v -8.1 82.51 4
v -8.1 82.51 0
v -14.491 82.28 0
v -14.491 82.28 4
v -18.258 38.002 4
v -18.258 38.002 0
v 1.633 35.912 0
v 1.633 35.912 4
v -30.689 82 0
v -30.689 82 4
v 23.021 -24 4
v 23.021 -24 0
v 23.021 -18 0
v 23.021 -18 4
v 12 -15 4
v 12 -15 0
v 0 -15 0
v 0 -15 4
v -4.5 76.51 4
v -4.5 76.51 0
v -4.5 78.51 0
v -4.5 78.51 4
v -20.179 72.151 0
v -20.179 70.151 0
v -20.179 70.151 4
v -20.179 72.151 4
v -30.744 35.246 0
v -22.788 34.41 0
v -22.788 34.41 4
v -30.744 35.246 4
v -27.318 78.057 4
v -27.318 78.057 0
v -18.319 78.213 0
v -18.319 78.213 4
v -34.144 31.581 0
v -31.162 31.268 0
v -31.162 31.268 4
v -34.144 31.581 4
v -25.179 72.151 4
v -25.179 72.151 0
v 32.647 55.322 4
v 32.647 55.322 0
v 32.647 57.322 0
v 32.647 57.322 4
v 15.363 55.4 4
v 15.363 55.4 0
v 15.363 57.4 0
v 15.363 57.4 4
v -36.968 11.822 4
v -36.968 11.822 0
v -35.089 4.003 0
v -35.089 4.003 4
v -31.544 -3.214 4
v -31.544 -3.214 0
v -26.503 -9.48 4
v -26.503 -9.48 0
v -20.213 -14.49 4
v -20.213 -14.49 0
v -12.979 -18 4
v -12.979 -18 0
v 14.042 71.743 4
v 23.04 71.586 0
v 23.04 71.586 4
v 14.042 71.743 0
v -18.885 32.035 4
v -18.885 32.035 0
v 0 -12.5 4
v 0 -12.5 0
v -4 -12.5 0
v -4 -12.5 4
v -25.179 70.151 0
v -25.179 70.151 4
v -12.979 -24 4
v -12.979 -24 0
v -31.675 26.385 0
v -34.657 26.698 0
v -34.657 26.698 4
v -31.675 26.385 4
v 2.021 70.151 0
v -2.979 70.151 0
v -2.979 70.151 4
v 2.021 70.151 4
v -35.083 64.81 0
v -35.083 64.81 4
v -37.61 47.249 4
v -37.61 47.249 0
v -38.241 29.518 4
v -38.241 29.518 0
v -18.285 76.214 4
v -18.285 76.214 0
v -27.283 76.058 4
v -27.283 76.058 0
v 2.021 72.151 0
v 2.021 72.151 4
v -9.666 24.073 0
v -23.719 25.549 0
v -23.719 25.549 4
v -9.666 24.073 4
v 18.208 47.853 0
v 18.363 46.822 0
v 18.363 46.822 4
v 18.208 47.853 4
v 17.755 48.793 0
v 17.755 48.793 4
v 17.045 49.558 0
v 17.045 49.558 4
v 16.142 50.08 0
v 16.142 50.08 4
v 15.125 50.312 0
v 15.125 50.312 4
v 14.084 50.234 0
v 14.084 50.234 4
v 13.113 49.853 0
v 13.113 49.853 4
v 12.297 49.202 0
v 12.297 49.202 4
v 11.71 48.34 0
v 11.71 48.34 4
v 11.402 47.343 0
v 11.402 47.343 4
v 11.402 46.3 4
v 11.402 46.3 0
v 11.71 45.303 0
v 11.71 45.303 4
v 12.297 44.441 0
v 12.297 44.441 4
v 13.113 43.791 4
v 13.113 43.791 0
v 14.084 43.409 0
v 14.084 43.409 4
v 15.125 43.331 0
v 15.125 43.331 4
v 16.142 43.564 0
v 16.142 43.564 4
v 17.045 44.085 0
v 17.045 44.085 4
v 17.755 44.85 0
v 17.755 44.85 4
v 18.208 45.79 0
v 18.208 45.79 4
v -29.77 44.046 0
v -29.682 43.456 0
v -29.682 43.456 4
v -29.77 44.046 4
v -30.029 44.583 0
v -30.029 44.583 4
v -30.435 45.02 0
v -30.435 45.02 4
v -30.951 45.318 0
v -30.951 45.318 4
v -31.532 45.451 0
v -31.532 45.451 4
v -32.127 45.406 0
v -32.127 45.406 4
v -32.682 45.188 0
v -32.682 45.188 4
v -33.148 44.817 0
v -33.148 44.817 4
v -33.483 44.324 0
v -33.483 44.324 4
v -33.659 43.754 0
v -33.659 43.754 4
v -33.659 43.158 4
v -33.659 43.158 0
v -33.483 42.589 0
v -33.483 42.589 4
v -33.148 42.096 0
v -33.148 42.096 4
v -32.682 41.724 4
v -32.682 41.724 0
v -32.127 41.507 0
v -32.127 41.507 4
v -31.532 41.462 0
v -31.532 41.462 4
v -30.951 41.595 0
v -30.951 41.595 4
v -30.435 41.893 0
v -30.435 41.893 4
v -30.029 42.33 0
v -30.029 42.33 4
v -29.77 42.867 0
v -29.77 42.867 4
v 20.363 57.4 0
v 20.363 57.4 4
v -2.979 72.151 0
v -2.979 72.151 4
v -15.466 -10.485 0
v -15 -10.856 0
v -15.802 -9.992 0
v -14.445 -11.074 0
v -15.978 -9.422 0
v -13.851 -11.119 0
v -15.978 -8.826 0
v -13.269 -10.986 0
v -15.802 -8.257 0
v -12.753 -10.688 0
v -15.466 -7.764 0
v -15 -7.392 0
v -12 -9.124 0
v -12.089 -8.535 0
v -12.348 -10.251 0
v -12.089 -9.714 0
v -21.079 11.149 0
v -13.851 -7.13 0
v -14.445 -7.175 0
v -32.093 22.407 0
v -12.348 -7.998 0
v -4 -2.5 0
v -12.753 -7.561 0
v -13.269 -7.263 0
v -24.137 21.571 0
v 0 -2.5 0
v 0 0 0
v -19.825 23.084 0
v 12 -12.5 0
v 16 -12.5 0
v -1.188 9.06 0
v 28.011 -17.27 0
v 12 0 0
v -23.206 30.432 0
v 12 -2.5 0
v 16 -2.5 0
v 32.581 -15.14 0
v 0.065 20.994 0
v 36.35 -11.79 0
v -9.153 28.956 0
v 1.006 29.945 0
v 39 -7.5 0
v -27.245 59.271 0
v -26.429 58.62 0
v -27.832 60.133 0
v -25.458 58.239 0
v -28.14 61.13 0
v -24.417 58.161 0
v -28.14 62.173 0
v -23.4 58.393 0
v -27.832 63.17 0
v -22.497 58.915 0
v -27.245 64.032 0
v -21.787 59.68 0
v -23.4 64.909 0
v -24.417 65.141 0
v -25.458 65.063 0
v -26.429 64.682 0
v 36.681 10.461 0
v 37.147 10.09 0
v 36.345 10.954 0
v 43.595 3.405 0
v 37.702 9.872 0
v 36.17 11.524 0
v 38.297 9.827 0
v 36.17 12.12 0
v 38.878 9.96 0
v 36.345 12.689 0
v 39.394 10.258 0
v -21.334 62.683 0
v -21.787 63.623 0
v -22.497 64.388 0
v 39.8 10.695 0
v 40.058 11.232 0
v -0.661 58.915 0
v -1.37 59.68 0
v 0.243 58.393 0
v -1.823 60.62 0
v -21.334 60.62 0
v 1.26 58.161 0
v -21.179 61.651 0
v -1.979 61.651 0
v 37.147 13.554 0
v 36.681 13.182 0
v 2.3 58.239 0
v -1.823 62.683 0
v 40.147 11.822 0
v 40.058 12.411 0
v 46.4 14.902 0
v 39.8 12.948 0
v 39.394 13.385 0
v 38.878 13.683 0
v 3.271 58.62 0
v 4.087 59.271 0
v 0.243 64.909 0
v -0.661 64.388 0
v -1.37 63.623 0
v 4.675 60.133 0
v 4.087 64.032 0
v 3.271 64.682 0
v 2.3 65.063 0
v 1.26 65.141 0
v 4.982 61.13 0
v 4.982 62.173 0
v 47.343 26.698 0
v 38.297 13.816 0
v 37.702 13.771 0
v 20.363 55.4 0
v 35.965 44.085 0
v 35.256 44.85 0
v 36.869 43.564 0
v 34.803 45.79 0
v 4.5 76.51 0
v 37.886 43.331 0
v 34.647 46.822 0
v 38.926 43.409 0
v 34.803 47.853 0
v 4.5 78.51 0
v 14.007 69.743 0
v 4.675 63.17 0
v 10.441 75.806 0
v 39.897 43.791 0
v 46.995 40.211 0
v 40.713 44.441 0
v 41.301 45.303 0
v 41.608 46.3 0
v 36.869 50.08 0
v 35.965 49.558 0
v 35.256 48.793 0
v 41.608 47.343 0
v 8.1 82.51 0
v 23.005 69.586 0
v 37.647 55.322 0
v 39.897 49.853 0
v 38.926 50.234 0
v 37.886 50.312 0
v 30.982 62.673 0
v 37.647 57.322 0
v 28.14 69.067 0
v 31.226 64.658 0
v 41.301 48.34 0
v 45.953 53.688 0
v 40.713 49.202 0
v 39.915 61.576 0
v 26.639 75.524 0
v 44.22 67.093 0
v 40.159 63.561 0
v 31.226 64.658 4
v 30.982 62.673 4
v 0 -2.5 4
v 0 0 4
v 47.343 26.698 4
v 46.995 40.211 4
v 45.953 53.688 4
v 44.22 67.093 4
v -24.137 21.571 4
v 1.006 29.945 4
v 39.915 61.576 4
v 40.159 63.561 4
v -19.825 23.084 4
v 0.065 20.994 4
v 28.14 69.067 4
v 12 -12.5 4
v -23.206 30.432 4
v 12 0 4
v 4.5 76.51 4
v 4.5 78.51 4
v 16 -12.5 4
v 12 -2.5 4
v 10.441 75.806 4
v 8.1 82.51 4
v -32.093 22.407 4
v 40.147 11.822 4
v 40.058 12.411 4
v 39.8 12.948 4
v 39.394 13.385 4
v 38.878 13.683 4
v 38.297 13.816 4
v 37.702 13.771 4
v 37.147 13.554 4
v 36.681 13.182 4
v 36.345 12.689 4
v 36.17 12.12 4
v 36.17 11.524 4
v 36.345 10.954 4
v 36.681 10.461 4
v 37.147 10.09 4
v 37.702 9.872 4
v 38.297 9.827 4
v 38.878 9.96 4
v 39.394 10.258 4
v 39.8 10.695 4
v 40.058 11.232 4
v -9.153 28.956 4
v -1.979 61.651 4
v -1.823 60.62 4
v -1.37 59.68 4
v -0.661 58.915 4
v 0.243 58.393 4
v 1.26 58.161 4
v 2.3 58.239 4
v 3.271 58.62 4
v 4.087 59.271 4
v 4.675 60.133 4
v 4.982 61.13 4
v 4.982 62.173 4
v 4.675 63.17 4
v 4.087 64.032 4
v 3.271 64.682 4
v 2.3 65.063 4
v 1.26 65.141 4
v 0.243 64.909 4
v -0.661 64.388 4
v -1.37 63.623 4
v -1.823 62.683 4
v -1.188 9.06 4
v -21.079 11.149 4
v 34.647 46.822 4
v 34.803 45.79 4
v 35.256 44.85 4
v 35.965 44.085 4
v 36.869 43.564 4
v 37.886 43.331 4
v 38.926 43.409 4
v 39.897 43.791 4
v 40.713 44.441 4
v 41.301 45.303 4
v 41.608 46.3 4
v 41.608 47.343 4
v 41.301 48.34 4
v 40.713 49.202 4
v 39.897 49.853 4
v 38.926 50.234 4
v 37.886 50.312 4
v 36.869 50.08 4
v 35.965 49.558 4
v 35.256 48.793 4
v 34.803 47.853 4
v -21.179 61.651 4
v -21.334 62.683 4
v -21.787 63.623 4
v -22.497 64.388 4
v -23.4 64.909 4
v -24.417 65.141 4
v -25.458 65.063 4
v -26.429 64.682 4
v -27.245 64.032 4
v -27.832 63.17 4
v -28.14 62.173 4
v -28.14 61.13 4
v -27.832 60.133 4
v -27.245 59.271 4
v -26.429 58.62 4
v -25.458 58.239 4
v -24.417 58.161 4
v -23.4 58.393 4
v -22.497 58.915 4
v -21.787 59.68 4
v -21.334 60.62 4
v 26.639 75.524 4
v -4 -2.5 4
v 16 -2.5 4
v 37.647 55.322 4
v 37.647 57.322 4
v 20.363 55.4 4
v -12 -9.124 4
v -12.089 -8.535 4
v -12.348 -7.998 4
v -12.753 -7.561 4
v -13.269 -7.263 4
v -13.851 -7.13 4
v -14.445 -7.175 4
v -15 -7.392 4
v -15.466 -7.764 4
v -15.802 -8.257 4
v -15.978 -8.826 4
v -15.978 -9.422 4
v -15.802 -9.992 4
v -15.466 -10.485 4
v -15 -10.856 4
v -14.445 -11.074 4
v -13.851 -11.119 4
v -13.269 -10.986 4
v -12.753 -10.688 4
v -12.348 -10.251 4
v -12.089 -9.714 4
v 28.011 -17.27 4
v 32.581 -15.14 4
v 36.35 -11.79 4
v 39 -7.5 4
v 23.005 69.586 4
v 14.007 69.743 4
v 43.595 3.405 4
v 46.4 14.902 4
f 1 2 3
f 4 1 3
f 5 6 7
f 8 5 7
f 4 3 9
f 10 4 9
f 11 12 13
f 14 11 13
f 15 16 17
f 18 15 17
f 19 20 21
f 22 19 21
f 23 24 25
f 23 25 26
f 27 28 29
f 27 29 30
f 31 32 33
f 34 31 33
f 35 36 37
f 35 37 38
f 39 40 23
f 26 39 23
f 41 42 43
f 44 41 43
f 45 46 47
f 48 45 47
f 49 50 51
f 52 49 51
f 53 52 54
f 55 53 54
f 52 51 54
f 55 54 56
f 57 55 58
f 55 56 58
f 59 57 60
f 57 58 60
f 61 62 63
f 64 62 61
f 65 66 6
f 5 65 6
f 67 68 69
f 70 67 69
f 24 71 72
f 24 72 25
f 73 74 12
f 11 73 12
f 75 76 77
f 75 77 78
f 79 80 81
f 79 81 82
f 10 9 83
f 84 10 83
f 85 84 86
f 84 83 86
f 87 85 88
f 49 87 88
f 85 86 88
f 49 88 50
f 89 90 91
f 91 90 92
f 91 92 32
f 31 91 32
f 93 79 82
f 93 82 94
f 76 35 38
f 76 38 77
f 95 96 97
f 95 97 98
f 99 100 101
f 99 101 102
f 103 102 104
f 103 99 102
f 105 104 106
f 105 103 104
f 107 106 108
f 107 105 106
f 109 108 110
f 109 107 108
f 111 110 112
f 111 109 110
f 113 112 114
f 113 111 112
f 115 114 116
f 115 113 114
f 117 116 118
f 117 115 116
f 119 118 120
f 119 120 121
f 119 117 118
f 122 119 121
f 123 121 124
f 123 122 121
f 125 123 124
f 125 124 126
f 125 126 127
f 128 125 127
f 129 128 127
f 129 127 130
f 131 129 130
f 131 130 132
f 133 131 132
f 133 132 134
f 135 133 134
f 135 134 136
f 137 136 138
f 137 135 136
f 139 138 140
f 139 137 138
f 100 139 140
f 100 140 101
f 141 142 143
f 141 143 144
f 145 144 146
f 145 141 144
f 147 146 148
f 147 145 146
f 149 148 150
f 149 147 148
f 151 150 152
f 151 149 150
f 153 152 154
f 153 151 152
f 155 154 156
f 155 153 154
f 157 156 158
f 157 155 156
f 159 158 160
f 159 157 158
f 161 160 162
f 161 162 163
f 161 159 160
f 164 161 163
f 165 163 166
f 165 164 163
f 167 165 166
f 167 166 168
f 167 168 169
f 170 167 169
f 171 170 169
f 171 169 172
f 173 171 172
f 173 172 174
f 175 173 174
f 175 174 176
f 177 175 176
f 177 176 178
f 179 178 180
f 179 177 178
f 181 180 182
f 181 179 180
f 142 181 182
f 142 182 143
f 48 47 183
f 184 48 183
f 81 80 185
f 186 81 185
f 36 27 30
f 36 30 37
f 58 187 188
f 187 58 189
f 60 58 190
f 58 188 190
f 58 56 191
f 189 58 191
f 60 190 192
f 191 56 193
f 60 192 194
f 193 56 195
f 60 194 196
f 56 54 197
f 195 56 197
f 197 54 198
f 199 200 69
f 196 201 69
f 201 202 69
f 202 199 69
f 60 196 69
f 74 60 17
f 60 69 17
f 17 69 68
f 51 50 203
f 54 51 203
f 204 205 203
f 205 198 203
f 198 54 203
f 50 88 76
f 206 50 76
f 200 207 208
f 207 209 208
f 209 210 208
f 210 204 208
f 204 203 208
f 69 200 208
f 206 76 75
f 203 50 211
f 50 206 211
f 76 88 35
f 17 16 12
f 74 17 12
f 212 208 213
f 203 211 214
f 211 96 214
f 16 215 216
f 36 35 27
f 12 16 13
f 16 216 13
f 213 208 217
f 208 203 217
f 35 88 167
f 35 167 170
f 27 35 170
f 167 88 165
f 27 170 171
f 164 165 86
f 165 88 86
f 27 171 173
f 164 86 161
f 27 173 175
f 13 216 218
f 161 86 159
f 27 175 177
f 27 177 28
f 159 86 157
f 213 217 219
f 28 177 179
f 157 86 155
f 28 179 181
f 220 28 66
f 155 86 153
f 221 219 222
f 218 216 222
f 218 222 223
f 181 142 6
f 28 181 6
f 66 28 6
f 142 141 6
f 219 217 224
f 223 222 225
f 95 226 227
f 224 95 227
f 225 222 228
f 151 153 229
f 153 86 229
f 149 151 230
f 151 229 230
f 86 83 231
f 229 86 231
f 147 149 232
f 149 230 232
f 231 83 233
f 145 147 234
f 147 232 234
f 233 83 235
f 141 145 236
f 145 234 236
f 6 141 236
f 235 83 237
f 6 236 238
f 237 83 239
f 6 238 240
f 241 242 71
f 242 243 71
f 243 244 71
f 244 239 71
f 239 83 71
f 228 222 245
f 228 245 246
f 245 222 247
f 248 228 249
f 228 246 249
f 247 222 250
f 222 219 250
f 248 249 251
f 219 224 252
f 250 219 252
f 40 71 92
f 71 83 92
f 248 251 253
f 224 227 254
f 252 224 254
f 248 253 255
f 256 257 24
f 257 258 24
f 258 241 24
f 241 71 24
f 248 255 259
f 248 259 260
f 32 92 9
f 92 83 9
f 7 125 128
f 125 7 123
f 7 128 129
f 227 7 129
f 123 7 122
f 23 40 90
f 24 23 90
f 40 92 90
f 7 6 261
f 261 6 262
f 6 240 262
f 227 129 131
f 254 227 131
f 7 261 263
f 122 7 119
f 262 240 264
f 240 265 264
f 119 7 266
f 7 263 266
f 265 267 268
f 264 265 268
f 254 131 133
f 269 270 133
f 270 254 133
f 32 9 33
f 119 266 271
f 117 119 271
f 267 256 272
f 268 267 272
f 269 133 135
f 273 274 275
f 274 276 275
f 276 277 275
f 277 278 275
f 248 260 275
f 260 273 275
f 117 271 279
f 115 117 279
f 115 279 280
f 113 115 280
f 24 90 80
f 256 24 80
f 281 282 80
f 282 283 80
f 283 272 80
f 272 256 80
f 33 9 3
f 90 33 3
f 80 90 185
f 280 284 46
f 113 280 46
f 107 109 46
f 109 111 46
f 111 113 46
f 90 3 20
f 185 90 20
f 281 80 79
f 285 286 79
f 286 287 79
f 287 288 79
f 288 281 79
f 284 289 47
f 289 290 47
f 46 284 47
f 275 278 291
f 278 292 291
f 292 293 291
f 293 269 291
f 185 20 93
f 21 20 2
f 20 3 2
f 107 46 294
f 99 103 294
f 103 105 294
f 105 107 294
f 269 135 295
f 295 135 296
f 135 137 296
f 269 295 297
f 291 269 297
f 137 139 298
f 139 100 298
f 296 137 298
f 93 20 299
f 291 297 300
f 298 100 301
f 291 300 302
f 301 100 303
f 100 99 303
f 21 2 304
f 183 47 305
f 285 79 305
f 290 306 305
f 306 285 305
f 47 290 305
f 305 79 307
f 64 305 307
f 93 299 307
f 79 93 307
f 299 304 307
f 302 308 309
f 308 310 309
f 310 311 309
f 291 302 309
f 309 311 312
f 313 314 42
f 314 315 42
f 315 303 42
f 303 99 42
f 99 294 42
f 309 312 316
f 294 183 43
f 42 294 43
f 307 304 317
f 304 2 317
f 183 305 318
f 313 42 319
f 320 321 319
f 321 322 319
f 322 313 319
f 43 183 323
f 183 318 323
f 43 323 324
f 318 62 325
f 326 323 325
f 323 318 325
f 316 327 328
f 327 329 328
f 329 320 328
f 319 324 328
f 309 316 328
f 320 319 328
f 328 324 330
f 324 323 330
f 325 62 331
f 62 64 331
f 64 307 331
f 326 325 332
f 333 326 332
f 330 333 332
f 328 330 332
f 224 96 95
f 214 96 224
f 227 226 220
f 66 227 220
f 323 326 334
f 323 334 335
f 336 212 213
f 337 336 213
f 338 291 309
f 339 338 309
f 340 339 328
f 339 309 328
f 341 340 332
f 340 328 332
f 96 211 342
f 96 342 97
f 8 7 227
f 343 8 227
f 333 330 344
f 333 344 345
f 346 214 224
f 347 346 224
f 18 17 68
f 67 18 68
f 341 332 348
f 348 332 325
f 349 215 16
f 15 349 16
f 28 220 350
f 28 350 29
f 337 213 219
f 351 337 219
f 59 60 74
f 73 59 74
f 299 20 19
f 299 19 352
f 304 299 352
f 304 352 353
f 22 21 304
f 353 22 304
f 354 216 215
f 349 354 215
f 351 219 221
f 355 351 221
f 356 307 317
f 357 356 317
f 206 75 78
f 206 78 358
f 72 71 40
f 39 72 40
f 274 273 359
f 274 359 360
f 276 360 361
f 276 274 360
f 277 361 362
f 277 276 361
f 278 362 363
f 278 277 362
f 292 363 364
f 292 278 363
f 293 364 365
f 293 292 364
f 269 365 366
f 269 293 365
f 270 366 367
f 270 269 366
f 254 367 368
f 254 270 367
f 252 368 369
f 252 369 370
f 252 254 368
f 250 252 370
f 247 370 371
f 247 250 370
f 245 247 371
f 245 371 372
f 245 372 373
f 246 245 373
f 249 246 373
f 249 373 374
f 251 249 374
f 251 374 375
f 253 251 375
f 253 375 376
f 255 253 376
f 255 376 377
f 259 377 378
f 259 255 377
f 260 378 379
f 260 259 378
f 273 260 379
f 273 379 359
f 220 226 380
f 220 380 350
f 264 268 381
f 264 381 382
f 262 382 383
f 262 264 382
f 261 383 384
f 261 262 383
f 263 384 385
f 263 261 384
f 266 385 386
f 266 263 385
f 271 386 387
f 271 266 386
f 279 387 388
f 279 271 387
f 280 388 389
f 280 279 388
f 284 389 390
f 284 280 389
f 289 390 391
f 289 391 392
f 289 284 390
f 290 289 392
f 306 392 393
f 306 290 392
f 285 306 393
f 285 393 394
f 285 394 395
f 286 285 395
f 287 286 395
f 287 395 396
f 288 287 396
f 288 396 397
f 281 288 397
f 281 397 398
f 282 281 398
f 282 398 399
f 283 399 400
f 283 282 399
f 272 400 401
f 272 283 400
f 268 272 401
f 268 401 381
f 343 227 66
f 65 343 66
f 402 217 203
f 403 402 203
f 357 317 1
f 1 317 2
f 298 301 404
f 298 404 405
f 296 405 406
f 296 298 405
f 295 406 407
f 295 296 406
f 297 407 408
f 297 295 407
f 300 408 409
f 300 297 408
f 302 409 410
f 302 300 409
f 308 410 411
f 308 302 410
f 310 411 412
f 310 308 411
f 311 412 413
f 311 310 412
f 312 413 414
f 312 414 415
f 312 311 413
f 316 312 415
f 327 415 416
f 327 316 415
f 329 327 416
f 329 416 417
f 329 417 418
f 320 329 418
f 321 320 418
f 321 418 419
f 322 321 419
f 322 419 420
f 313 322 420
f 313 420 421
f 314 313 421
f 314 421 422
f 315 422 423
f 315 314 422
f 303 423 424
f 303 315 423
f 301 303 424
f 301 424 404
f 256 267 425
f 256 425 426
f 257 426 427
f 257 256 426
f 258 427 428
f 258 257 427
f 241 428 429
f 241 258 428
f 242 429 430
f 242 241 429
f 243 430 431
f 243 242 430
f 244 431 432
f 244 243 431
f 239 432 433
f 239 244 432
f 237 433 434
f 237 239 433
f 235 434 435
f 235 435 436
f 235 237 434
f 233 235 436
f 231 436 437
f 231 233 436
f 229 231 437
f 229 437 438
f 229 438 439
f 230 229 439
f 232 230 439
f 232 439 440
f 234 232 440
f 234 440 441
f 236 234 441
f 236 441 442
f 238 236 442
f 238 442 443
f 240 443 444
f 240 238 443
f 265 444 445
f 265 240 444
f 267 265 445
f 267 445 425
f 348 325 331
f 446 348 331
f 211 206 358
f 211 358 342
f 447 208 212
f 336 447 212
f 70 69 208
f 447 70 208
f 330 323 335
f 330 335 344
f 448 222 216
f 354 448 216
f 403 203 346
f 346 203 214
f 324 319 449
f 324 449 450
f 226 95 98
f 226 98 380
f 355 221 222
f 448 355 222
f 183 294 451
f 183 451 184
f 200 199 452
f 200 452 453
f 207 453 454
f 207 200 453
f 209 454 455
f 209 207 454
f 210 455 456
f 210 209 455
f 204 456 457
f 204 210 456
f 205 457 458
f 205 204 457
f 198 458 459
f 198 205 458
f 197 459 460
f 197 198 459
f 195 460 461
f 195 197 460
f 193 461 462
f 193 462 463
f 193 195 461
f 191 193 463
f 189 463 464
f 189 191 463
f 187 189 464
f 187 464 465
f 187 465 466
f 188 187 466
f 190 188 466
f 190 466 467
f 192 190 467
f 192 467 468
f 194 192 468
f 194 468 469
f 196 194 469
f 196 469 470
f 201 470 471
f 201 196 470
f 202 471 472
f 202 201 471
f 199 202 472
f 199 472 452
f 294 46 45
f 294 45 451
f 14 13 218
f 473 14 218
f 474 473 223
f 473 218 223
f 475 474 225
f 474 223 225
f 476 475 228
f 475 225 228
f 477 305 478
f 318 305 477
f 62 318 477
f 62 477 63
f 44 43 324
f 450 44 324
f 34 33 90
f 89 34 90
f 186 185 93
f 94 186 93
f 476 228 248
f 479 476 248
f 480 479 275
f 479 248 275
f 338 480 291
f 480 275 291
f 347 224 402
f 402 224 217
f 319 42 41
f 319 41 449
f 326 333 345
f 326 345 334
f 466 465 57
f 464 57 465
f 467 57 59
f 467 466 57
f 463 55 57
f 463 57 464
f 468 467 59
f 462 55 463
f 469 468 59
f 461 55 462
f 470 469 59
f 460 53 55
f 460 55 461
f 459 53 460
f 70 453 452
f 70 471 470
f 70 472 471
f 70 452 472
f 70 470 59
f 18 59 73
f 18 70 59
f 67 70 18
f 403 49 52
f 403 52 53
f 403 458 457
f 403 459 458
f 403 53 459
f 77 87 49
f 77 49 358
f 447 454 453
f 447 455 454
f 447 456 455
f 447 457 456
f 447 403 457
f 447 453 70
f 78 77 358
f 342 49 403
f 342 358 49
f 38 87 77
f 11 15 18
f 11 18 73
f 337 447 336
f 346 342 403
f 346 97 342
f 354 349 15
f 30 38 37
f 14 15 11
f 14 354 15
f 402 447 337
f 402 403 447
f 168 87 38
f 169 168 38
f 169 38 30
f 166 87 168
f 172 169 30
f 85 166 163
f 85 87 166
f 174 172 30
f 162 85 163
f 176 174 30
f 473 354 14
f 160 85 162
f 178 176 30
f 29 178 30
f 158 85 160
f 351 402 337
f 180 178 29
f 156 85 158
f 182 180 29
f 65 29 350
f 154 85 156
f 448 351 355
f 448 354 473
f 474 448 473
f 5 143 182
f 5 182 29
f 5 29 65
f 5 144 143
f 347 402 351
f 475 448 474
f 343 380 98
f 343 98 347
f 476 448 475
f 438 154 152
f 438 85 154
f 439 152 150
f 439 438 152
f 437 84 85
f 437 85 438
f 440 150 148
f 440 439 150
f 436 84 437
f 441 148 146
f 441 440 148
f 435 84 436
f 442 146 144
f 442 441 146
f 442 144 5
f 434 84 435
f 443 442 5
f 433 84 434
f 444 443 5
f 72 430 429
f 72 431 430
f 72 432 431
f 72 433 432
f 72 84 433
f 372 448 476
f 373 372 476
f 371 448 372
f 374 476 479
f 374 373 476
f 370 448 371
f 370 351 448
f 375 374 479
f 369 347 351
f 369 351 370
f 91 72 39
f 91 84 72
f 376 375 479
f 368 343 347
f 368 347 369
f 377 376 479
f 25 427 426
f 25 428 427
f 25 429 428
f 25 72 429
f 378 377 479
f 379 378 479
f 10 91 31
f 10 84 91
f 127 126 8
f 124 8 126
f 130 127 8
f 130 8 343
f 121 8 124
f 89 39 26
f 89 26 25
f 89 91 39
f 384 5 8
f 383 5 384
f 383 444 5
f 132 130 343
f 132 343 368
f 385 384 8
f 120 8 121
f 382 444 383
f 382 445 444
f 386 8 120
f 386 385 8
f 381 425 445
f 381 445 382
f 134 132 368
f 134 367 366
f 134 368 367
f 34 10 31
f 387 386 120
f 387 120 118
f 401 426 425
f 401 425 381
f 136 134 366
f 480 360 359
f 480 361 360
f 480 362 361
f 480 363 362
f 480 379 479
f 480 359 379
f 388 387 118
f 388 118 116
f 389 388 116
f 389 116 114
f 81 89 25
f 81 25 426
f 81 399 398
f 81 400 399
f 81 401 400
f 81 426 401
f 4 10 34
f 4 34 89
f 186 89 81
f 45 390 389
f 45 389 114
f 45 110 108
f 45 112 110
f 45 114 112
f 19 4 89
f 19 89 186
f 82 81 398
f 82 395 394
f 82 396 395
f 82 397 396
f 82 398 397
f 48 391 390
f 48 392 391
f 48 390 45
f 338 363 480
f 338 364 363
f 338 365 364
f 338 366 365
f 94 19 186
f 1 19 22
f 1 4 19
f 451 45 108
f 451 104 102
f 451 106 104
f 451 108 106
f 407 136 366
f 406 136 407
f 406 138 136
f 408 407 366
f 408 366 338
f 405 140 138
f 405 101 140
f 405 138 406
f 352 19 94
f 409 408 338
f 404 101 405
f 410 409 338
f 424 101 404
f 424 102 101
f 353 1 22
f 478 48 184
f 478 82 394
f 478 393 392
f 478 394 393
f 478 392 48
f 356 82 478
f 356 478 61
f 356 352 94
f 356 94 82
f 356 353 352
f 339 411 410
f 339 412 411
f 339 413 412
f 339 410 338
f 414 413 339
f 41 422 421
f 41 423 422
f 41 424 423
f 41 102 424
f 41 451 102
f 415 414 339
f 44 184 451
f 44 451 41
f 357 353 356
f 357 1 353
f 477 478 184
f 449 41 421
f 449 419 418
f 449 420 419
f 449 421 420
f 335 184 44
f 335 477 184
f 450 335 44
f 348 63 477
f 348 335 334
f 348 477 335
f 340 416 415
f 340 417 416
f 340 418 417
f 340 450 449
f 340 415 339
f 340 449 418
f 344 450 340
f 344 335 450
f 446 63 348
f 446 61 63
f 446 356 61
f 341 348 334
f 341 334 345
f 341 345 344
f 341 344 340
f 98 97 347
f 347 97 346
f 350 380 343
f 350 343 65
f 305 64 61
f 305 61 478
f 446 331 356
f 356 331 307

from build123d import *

# Parameters (mm, degrees)
SKETCH1_R           = 2
SKETCH1_R_2         = 3.5
SKETCH1_W           = 9
SKETCH1_H           = 2
SKETCH1_W_2         = 5
BOSS_EXTRUDE1_DEPTH = 4


with BuildPart() as part:
    # Sketch1 → Boss-Extrude1 (new body)
    with BuildSketch(Plane.XY):
        with BuildLine():
            Line((-12.978640908, -18), (-12.978640908, -24))
            Line((-12.978640908, -24), (23.021359092, -24))
            Line((23.021359092, -24), (23.021359092, -18))
            ThreePointArc((23.021359092, -18), (32.58126188, -15.140073441), (39, -7.5))
            ThreePointArc((39, -7.5), (45.227131985, 9.097629123), (47.343034567, 26.698237678))
            ThreePointArc((47.343034567, 26.698237678), (46.561018226, 46.955835458), (44.219623828, 67.092858318))
            Line((44.219623828, 67.092858318), (28.140376172, 69.067141682))
            Line((28.140376172, 69.067141682), (26.638766331, 75.523635508))
            Line((26.638766331, 75.523635508), (10.441233669, 75.806364492))
            Line((10.441233669, 75.806364492), (8.1, 82.51))
            Line((8.1, 82.51), (-8.1, 82.51))
            Line((-8.1, 82.51), (-14.491217975, 82.280462515))
            Line((-14.491217975, 82.280462515), (-30.688782025, 81.999537485))
            ThreePointArc((-30.688782025, 81.999537485), (-37.609553588, 47.248902923), (-36.96836533, 11.821617405))
            ThreePointArc((-36.96836533, 11.821617405), (-29.196719191, -6.486518424), (-12.978640908, -18))
        make_face()
        with Locations((38.147341743, 11.821617405)):
            Circle(SKETCH1_R, mode=Mode.SUBTRACT)
        with Locations((-24.678960076, 61.651218734)):
            Circle(SKETCH1_R_2, mode=Mode.SUBTRACT)
        with Locations((1.521420673, 61.651218734)):
            Circle(SKETCH1_R_2, mode=Mode.SUBTRACT)
        with Locations((14.86306514, 46.821617405)):
            Circle(SKETCH1_R_2, mode=Mode.SUBTRACT)
        with Locations((38.147341743, 46.821617405)):
            Circle(SKETCH1_R_2, mode=Mode.SUBTRACT)
        with Locations((-31.681501662, 43.456405989)):
            Circle(SKETCH1_R, mode=Mode.SUBTRACT)
        with Locations((-14, -9.124358763)):
            Circle(SKETCH1_R, mode=Mode.SUBTRACT)
        with Locations((0, 77.51)):
            Rectangle(SKETCH1_W, SKETCH1_H, mode=Mode.SUBTRACT)
        Polygon((-4, -2.5), (0, -2.5), (0, 0), (12, 0), (12, -2.5), (16, -2.5), (16, -12.5), (12, -12.5), (12, -15), (0, -15), (0, -12.5), (-4, -12.5), align=None, mode=Mode.SUBTRACT)
        with Locations((35.147341743, 56.321617405)):
            Rectangle(SKETCH1_W_2, SKETCH1_H, mode=Mode.SUBTRACT)
        Polygon((-27.318093916, 78.057395991), (-18.319447222, 78.213465452), (-18.284765119, 76.213766187), (-27.283411813, 76.057696726), align=None, mode=Mode.SUBTRACT)
        with Locations((17.86306514, 56.399848624)):
            Rectangle(SKETCH1_W_2, SKETCH1_H, mode=Mode.SUBTRACT)
        with Locations((-0.478579327, 71.151218734)):
            Rectangle(SKETCH1_W_2, SKETCH1_H, mode=Mode.SUBTRACT)
        Polygon((14.041615104, 71.742910288), (14.006710291, 69.743214898), (23.005339548, 69.58614324), (23.040244361, 71.58583863), align=None, mode=Mode.SUBTRACT)
        Polygon((40.158980309, 63.561403348), (31.226064944, 64.658227439), (30.982326257, 62.673135135), (39.915241622, 61.576311045), align=None, mode=Mode.SUBTRACT)
        Polygon((1.632632483, 35.912105076), (1.005748572, 29.944943559), (-18.884789816, 32.034556594), (-18.257905905, 38.00171811), align=None, mode=Mode.SUBTRACT)
        with Locations((-22.678960076, 71.151218734)):
            Rectangle(SKETCH1_W_2, SKETCH1_H, mode=Mode.SUBTRACT)
        Polygon((0.065422707, 20.994201285), (-1.188345114, 9.059878252), (-21.078883502, 11.149491286), (-19.825115681, 23.083814319), align=None, mode=Mode.SUBTRACT)
        Polygon((-9.666, 24.072796069), (-9.153, 28.955923243), (-23.205665371, 30.432234852), (-22.787742764, 34.410342529), (-30.743958119, 35.246187743), (-31.161880726, 31.268080066), (-34.143965433, 31.581364852), (-34.656965433, 26.698237678), (-31.674880726, 26.384952891), (-32.092803333, 22.406845214), (-24.136587978, 21.571), (-23.718665371, 25.549107678), align=None, mode=Mode.SUBTRACT)
    extrude(amount=BOSS_EXTRUDE1_DEPTH)


solid = part.part
